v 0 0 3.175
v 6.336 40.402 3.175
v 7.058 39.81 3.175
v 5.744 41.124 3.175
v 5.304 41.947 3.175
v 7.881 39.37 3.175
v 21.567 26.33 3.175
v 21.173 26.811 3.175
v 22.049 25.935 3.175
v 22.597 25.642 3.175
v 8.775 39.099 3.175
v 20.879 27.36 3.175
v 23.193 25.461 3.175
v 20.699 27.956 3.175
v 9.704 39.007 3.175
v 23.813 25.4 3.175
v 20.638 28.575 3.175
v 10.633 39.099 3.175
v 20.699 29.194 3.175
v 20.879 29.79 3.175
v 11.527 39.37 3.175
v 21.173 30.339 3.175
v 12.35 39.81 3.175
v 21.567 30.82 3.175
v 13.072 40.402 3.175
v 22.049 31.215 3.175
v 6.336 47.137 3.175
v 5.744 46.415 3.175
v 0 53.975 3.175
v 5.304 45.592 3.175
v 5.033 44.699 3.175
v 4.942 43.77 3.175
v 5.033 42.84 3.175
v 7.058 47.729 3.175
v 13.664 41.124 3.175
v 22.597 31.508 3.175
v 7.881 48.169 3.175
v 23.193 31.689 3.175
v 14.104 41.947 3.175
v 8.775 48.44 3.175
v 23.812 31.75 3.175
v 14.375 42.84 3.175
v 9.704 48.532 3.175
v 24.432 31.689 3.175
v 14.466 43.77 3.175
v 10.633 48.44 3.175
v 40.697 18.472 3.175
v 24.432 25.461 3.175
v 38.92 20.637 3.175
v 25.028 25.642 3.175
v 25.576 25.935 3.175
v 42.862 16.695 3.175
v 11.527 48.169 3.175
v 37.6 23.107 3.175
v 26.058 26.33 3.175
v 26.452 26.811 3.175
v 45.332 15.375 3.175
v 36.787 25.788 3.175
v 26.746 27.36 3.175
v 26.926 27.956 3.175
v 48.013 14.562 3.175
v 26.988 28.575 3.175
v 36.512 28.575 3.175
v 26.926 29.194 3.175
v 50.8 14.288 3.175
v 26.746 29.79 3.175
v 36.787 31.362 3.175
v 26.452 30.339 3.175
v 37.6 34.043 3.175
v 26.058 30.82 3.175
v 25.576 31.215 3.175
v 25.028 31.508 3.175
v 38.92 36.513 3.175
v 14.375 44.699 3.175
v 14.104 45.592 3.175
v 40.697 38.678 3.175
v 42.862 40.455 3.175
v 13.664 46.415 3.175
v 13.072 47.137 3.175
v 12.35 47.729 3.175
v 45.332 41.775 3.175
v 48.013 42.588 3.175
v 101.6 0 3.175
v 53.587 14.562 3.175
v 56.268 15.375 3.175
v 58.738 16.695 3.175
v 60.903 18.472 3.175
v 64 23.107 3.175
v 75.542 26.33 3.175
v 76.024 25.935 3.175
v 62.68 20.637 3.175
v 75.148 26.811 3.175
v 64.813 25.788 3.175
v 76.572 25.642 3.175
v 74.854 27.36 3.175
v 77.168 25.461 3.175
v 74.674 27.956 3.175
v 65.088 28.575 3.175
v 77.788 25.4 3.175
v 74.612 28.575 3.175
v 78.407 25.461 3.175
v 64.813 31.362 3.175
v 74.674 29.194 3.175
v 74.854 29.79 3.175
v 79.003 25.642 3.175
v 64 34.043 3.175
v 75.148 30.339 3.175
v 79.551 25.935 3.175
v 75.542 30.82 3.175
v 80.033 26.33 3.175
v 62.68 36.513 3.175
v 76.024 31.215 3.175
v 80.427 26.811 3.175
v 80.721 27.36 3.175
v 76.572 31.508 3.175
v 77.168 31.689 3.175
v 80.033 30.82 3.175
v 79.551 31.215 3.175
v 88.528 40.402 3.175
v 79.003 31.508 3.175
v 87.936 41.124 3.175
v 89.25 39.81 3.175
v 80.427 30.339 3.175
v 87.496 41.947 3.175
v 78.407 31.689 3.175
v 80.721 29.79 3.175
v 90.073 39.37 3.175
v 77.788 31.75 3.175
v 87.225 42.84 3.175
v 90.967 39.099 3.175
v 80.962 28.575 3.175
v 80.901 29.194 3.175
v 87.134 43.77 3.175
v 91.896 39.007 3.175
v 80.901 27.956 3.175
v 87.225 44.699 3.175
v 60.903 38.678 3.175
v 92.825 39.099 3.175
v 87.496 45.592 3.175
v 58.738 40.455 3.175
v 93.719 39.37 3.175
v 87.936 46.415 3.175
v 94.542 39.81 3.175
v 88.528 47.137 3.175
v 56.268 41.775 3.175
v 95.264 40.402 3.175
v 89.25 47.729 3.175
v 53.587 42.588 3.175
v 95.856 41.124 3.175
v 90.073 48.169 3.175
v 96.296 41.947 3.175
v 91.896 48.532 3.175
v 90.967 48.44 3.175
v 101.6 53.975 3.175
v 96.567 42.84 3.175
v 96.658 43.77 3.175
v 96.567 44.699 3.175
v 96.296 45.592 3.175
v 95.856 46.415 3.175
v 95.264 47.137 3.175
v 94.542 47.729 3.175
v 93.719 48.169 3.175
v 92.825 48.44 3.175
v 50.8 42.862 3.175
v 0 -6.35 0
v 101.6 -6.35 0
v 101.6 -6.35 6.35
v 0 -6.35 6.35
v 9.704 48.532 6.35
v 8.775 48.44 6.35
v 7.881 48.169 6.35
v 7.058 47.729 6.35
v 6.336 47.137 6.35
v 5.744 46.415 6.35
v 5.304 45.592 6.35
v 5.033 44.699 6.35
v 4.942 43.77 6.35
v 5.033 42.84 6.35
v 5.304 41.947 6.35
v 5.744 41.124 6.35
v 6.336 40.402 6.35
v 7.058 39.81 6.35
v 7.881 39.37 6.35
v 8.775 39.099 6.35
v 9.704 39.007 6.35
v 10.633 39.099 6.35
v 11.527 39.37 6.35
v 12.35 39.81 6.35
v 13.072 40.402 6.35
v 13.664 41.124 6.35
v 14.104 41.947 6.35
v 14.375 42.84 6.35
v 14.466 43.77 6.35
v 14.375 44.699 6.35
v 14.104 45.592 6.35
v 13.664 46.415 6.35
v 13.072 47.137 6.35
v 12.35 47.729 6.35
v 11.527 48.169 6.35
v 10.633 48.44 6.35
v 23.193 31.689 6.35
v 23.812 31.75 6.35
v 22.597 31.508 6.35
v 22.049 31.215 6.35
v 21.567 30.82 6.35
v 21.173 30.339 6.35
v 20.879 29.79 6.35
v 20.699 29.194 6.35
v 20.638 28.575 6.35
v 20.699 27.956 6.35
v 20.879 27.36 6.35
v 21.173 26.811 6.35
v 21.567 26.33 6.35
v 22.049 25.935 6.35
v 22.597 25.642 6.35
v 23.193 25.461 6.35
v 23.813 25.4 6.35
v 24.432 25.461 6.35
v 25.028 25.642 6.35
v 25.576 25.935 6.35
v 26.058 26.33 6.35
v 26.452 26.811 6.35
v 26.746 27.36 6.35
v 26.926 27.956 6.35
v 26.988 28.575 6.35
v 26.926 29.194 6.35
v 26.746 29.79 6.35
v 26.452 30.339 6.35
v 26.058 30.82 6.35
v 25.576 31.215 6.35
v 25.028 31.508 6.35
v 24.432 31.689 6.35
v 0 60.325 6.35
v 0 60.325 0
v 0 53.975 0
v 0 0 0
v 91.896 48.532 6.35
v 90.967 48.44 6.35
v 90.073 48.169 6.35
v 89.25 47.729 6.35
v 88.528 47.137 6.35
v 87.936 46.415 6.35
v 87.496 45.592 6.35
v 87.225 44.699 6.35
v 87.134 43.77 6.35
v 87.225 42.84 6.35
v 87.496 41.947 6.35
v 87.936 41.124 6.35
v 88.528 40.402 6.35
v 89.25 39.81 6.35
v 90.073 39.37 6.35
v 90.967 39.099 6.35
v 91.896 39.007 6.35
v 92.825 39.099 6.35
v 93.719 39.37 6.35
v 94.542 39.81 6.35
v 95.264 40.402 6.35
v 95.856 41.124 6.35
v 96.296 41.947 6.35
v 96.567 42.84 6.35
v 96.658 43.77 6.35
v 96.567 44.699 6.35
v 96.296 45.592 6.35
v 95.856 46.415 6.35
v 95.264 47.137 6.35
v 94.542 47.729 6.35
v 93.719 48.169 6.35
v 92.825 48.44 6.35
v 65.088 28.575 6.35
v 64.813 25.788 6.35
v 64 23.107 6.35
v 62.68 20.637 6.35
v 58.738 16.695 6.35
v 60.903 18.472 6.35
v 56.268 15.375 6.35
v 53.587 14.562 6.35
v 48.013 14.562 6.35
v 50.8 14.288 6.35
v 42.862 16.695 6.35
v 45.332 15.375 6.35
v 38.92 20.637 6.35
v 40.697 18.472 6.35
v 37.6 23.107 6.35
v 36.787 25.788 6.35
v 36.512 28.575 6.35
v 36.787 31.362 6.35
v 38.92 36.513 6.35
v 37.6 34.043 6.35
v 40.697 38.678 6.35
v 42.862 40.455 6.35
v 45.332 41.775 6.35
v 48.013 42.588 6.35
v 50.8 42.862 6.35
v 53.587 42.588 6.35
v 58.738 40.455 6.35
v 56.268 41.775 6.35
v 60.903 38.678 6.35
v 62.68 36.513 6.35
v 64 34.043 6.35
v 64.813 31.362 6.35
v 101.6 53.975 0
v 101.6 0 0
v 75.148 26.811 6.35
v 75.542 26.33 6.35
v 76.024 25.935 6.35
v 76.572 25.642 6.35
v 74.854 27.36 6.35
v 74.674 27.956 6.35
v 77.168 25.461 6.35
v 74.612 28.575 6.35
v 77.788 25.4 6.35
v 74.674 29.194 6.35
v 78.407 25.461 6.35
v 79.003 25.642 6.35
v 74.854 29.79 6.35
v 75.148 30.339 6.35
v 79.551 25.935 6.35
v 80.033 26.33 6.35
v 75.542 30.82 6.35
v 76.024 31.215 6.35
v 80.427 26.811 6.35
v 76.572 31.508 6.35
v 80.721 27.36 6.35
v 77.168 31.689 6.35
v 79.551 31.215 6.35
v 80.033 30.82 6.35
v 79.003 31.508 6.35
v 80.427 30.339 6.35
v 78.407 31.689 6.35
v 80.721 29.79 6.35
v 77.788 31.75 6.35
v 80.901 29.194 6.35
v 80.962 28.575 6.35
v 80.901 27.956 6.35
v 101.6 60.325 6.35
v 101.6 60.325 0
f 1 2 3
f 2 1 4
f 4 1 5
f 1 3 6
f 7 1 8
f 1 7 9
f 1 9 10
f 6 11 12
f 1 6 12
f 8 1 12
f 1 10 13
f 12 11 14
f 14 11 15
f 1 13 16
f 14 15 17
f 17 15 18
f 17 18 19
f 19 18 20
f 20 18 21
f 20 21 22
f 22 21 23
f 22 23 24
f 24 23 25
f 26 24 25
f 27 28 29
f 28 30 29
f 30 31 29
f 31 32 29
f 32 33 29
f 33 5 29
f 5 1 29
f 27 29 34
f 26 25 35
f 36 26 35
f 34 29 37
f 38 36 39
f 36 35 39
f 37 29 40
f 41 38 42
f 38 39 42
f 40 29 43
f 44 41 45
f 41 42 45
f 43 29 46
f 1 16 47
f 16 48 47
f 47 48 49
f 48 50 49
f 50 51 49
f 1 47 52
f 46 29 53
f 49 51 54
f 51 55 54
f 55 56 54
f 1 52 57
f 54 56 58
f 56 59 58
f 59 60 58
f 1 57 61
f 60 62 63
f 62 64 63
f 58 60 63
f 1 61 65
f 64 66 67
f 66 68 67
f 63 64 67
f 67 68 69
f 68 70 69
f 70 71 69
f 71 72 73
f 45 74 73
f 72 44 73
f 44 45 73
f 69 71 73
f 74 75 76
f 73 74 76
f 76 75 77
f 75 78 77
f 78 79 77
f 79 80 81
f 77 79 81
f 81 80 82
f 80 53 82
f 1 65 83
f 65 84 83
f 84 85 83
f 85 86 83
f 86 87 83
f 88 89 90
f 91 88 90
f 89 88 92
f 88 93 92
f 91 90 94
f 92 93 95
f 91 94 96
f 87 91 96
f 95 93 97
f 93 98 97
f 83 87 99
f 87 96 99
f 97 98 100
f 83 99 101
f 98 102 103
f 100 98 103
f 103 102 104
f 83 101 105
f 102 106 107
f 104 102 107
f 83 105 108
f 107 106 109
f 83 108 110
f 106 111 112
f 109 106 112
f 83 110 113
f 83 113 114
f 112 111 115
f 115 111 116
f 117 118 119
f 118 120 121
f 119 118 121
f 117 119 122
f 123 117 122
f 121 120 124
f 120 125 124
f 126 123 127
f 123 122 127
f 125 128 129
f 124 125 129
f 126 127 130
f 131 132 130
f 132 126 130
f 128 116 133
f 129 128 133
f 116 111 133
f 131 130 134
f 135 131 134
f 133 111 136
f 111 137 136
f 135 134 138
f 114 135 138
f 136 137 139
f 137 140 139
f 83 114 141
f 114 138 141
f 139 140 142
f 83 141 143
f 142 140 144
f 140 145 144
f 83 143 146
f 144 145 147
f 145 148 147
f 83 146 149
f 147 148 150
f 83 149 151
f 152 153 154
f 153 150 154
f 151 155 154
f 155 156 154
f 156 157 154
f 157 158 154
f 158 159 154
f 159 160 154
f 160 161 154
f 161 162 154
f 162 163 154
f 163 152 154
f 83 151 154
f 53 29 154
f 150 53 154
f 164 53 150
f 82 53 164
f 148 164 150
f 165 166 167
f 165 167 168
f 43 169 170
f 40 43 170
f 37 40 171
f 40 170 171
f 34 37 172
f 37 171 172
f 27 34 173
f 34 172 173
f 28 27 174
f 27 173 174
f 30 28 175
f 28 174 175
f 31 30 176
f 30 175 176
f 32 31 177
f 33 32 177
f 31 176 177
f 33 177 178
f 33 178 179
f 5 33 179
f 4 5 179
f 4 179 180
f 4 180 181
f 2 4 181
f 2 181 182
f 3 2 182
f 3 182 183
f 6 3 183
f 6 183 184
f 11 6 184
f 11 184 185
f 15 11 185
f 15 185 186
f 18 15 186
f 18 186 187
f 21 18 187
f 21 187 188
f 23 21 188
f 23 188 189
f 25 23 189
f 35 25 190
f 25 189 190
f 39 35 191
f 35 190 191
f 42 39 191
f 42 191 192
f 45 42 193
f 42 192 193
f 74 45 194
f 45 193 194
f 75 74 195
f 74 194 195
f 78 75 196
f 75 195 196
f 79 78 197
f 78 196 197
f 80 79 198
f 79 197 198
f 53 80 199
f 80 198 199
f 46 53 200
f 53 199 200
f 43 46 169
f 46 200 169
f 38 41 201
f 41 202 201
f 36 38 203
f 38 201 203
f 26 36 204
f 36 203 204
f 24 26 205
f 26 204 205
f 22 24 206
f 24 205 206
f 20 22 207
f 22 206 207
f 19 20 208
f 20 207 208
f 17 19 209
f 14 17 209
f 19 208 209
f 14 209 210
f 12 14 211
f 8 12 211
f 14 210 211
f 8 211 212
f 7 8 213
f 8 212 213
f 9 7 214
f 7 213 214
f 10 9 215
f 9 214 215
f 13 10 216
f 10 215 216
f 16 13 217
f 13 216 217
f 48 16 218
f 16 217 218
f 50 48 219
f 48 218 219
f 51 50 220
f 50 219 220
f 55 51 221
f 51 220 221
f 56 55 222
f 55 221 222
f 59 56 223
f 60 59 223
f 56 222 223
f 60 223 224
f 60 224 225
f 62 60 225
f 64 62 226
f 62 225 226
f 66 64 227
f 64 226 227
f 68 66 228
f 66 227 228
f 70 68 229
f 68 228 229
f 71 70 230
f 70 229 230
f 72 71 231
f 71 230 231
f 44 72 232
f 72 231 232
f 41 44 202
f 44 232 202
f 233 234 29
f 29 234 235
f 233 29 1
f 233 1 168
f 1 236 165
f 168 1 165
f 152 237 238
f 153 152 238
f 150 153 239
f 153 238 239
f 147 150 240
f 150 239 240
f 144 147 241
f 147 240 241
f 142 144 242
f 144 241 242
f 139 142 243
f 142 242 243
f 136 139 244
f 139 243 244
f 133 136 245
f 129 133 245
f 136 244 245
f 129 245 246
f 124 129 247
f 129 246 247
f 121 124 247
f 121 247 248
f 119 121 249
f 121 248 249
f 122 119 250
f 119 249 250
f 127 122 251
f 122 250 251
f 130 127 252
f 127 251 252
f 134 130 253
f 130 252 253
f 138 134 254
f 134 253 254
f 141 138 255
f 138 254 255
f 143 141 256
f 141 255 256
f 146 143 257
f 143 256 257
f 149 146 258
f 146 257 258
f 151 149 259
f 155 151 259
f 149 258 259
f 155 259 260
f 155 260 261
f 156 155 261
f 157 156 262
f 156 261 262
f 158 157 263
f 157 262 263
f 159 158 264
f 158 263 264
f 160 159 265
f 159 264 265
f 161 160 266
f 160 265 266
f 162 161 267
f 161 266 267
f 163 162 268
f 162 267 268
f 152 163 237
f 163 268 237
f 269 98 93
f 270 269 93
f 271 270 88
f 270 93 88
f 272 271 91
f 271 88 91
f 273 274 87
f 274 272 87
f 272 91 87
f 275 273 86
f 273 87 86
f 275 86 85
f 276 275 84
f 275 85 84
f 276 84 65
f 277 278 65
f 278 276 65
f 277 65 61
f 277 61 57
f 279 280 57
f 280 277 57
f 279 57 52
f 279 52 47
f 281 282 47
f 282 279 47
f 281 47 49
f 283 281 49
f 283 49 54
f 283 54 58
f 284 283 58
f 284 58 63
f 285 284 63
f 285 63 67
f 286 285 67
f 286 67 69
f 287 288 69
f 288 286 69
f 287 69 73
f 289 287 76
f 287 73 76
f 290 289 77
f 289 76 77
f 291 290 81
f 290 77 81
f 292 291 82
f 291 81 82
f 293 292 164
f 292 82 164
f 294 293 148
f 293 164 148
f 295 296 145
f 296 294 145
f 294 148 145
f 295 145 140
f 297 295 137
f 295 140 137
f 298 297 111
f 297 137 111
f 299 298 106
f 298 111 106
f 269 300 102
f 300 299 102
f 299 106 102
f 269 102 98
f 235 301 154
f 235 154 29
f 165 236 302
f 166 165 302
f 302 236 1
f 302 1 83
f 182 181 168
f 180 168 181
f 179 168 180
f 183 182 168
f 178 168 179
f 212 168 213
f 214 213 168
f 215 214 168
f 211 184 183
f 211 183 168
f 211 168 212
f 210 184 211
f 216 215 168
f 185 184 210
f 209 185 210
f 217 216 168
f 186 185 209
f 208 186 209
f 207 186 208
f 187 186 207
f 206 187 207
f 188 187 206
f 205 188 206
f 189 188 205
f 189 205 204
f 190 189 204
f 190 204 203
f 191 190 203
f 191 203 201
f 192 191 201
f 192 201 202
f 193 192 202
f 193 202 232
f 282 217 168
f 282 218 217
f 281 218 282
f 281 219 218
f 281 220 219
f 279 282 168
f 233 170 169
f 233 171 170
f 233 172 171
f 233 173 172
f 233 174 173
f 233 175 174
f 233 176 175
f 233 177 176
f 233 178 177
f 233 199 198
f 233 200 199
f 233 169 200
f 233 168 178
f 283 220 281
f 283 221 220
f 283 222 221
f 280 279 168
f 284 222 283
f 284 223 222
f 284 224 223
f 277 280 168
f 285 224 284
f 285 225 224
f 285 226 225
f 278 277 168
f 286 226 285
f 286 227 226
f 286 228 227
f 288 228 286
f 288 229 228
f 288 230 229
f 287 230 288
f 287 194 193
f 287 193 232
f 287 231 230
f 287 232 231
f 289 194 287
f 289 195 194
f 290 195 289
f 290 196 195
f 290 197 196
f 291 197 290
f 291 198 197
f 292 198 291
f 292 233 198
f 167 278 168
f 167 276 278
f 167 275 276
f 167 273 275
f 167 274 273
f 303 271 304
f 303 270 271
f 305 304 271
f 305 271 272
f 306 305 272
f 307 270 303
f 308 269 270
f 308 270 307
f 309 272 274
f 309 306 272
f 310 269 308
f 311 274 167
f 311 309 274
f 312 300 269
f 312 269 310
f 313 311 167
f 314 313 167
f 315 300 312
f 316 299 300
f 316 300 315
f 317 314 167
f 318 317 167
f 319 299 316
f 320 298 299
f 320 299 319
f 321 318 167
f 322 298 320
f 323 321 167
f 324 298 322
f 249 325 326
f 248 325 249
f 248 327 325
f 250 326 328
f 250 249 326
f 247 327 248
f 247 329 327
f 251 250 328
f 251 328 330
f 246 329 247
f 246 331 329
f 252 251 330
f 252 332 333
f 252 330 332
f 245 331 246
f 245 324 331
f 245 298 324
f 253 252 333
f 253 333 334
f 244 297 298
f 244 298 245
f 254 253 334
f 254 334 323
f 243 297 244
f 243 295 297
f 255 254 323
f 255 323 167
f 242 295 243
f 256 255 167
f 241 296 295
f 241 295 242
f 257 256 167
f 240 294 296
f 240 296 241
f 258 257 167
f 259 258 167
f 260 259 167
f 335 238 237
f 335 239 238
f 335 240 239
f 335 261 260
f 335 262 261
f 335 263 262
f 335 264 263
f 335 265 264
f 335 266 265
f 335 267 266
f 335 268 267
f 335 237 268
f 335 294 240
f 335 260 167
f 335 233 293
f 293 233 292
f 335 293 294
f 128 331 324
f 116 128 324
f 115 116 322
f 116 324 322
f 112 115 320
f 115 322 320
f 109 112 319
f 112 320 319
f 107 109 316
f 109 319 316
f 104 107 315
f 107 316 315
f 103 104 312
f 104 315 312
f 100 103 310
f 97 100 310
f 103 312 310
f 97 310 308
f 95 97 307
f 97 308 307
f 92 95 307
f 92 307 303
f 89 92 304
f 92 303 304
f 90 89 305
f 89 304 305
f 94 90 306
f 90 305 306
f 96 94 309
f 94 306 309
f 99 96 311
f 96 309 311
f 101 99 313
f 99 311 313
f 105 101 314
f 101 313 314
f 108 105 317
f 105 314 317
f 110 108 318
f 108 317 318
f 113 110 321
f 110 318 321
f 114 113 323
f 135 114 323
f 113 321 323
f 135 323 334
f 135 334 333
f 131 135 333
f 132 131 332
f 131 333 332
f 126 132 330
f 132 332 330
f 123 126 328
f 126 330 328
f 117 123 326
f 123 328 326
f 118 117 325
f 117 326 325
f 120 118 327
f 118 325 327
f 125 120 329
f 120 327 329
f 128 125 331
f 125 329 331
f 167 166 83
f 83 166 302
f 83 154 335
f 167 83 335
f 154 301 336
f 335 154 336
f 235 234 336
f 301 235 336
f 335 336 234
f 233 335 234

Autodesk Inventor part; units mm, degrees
ref_plane "YZ Plane" through (0, 0, 0) normal (1, 0, 0) x (0, 1, 0)
ref_plane "XZ Plane" through (0, 0, 0) normal (0, 1, 0) x (-1, 0, 0)
ref_plane "XY Plane" through (0, 0, 0) normal (0, 0, 1) x (1, 0, 0)
sketch "Sketch1" plane through (0, 0, 0) normal (0, 0, 1) x (1, 0, 0)
  line L0 (0, 0) -> (101.6, 0)
  line L1 (101.6, 0) -> (101.6, 53.975)
  line L2 (101.6, 53.975) -> (0, 53.975)
  line L3 (0, 53.975) -> (0, 0)
  circle A0 centre (50.8, 28.575) radius 14.2875
  line L4 (23.8125, 28.575) -> (50.8, 28.575) construction
  line L5 (50.8, 28.575) -> (77.7875, 28.575) construction
  line L6 (50.8, 28.575) -> (50.8, 53.975) construction
  line L7 (101.6, 0) -> (101.6, -6.35)
  line L8 (101.6, -6.35) -> (0, -6.35)
  line L9 (0, -6.35) -> (0, 0)
  line L10 (0, 53.975) -> (101.6, 53.975)
  line L11 (101.6, 53.975) -> (101.6, 60.325)
  line L12 (101.6, 60.325) -> (0, 60.325)
  line L13 (0, 60.325) -> (0, 53.975)
  point P0 (9.704, 43.7695)
  point P1 (91.896, 43.7695)
  dimension "d0" = 53.975
  dimension "d2" = 101.6
  dimension "d3" = 28.575
  dimension "d4" = 50.8
  dimension "d5" = 28.575
  dimension "d6" = 26.9875
  dimension "d7" = 41.096
  dimension "d8" = 15.1945
  dimension "d9" = 6.35
  dimension "d10" = 6.35
extrude "Extrusion1" add sketch "Sketch1" along normal blind 6.35
extrude "Extrusion2" cut sketch "Sketch1" along normal blind 3.175 contours L3 L2 L1 L0
hole "Hole1" at (23.8125, 28.575, 0) at (77.7875, 28.575, 0) direction (0, 0, 1) diameter 6.35 end through all
hole "Hole2" at (9.704, 43.7695, 0) at (91.896, 43.7695, 0) direction (0, 0, 1) diameter 9.525 end through all
equation "\"d4\" = 0.5 * d2"
properties part number "Mounting Jig"
